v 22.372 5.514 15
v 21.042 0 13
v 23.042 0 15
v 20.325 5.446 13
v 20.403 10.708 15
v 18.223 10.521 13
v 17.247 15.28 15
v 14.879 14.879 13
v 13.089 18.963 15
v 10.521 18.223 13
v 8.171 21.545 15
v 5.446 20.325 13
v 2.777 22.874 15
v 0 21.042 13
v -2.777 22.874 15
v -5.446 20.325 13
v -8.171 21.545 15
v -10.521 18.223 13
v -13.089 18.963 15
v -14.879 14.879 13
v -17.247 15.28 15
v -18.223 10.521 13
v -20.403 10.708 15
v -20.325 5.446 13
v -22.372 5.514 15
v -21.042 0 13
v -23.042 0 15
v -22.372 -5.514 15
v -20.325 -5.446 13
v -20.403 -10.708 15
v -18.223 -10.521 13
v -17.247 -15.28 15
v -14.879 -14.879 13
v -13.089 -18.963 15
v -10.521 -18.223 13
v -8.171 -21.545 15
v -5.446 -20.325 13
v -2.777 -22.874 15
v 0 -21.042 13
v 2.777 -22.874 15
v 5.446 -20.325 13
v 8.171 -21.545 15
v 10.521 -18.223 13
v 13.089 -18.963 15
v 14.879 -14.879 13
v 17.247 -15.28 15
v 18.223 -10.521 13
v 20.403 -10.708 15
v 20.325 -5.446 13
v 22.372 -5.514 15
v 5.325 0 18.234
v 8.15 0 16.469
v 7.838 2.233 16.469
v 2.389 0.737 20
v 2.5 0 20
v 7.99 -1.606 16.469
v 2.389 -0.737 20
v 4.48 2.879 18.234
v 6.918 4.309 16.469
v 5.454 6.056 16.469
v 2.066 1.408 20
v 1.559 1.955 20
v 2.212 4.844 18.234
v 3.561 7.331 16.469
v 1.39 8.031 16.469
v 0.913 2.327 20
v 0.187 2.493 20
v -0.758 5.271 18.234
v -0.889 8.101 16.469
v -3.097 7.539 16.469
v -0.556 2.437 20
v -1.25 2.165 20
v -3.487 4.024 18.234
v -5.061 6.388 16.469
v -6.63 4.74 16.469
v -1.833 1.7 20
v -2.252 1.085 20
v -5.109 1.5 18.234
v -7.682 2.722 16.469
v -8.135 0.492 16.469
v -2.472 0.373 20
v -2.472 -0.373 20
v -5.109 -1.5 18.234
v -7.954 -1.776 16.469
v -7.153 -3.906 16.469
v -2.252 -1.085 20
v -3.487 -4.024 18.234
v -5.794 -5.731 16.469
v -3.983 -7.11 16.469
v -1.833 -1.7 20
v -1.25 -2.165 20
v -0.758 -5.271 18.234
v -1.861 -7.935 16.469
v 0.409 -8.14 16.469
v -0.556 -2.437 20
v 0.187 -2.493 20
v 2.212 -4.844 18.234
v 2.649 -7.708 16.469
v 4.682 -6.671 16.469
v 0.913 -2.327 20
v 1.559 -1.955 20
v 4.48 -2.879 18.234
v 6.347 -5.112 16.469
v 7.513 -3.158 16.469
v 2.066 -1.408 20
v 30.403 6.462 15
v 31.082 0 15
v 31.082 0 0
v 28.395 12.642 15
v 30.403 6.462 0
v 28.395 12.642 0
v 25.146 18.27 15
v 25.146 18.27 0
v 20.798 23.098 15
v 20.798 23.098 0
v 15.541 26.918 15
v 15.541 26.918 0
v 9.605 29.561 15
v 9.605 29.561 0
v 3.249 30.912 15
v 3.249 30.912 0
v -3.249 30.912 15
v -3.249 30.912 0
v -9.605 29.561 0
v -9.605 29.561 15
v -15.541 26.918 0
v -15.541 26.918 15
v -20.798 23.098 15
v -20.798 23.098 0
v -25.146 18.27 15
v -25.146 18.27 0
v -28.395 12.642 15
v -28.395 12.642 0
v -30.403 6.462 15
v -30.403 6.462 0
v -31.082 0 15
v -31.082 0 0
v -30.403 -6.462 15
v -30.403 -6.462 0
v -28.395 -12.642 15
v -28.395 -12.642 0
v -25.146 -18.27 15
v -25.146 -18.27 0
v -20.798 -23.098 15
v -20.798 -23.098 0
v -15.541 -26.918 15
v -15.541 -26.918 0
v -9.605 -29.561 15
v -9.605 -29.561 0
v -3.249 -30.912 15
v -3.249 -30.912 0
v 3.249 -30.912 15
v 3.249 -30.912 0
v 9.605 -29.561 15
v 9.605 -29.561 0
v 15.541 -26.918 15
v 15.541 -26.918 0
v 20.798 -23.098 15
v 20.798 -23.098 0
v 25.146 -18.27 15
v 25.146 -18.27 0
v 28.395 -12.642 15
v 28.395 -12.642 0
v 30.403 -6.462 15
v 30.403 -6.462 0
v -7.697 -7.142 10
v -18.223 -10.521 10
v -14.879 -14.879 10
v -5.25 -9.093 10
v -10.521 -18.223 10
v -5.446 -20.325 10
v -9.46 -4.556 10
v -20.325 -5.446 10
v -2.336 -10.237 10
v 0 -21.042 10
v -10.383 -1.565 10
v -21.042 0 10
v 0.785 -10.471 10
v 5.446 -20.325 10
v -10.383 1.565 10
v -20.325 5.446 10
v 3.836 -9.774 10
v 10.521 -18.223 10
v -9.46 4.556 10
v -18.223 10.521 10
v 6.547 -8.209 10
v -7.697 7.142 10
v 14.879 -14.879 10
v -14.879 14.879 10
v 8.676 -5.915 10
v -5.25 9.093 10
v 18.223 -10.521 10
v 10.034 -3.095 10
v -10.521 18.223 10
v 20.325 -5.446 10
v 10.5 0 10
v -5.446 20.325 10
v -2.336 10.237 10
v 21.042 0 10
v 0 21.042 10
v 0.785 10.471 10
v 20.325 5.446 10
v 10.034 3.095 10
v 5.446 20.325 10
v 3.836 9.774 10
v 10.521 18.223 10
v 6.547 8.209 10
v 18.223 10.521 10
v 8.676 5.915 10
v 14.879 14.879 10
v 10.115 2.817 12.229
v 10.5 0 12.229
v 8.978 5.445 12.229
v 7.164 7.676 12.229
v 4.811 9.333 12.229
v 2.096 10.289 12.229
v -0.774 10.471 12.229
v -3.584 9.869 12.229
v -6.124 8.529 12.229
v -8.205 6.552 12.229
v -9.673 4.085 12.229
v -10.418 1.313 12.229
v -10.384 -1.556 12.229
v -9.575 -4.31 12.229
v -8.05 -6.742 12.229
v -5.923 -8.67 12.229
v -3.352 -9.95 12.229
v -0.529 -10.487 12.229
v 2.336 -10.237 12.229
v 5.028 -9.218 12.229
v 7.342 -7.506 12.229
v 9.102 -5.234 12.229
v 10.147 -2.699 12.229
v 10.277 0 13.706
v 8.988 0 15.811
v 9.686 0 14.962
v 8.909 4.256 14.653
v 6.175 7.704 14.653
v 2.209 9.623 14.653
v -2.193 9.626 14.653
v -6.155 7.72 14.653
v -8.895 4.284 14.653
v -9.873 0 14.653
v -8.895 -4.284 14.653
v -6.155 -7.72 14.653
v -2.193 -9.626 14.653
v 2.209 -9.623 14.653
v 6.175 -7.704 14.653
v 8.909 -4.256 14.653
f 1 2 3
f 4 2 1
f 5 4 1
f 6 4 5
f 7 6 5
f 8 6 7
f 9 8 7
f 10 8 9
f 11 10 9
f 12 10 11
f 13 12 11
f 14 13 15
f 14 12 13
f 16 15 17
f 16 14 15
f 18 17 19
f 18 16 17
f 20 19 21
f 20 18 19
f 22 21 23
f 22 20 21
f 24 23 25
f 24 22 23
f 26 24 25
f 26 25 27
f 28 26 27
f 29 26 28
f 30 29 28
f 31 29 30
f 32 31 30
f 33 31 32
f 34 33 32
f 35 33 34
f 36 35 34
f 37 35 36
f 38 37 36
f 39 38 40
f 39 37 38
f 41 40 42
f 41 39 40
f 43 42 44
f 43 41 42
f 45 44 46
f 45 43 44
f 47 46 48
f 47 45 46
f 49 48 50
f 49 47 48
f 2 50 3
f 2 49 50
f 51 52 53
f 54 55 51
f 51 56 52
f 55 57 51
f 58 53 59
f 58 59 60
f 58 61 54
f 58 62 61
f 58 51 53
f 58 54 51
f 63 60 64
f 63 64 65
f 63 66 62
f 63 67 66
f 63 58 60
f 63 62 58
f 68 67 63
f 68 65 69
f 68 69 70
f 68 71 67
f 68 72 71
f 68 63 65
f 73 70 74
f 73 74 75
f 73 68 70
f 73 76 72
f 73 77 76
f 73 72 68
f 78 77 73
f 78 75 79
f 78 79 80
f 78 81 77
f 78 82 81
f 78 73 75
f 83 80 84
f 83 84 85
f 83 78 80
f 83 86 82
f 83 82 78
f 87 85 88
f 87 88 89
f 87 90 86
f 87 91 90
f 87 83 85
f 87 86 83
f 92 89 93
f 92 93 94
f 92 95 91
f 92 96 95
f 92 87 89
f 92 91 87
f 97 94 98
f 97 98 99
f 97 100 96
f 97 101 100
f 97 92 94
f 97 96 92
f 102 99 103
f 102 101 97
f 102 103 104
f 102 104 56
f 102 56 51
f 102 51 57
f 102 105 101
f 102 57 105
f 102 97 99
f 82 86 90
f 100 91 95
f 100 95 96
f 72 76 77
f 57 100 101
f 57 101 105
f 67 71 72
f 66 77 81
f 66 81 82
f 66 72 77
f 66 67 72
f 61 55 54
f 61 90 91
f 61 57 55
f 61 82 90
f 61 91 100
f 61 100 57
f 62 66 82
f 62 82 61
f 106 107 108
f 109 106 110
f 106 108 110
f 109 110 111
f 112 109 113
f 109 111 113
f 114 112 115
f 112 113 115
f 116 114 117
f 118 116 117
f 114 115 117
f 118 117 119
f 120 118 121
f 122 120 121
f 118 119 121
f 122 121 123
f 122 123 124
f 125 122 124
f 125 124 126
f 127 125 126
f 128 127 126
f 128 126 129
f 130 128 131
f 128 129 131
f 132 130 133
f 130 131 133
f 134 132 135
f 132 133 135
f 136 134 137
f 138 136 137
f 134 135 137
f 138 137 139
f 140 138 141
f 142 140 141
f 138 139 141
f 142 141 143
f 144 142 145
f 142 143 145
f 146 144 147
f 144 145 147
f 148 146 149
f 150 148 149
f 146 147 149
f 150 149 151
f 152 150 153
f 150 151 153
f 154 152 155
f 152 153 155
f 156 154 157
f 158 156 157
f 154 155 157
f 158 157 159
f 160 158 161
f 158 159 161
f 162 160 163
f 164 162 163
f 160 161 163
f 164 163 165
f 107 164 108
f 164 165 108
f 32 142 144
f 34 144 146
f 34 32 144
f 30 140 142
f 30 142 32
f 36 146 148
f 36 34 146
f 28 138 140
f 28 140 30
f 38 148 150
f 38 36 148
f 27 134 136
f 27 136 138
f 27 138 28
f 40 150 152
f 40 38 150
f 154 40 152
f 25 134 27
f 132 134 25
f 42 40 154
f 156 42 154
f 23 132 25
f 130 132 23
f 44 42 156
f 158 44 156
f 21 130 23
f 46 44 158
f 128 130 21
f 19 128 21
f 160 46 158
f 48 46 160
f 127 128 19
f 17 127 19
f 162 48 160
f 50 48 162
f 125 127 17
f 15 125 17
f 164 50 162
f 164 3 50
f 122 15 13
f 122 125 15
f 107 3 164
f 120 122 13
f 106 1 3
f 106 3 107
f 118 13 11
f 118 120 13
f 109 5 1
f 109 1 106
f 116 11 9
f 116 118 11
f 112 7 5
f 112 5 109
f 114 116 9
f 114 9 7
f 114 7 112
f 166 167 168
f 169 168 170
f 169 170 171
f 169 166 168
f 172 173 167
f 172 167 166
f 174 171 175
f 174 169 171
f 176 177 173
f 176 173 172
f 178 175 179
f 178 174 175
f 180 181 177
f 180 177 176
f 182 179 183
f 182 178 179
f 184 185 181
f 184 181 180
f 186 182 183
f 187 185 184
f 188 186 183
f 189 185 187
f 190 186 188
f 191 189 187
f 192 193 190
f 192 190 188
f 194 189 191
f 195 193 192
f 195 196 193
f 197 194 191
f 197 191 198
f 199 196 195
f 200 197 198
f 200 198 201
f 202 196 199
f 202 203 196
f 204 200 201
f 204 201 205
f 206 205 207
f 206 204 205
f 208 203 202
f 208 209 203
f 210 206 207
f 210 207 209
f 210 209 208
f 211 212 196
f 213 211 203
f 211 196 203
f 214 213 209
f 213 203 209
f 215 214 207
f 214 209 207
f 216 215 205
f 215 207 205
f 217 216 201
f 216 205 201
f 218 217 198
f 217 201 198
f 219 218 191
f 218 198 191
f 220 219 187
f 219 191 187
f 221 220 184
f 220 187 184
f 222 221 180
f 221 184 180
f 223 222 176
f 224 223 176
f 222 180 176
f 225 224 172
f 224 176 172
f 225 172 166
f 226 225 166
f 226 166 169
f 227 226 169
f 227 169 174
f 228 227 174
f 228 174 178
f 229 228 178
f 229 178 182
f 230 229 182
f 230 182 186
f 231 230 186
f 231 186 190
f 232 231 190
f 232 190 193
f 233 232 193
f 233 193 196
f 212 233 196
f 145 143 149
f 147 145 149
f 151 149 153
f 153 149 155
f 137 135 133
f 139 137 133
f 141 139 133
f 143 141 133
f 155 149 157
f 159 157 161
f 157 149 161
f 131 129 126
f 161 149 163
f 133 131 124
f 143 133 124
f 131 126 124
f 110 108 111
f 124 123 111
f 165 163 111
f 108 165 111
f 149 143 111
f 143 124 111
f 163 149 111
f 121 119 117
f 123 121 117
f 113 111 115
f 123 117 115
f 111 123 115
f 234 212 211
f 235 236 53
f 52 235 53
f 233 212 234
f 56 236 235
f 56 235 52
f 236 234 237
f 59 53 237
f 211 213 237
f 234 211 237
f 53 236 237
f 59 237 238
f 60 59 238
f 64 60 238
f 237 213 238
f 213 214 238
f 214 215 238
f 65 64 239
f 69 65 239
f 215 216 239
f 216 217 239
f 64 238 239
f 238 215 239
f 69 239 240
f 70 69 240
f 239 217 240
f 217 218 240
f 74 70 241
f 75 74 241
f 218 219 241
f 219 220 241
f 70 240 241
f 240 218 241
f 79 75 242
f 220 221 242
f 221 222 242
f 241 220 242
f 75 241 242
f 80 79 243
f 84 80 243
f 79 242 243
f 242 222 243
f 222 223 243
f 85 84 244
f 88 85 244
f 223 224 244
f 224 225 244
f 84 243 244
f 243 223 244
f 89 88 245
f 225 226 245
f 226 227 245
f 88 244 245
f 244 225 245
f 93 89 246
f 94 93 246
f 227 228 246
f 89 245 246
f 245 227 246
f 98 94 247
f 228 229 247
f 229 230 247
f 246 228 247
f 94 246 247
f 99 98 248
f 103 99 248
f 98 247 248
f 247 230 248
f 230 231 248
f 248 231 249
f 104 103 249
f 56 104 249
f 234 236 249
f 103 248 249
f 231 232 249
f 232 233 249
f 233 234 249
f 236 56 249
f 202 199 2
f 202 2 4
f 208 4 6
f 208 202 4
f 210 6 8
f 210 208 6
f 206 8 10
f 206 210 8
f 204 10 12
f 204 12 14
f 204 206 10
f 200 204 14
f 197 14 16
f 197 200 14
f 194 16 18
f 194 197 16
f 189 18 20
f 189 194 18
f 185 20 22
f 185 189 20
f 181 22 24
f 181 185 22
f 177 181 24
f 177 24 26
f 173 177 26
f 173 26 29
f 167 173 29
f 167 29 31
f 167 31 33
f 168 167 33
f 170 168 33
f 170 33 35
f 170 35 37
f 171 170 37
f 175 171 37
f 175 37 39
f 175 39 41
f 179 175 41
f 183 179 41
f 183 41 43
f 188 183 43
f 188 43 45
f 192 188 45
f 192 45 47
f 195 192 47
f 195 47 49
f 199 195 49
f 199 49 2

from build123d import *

# Parameters (mm, degrees)
F0_R     = 10.5
F1_DEPTH = 15
F0_R_2   = 21.042
F4_DEPTH = 10
F0_R_3   = 31.082
F5_DEPTH = 15
F6_SIZE  = 2
F7_R     = 5


with BuildPart() as f1:
    # F0 (on Top) → F1 (new body)
    with BuildSketch(Plane.XY):
        Circle(F0_R)
    extrude(amount=F1_DEPTH)

    # F2 (on Front) → F3 (revolve)
    with BuildSketch(Plane.XZ):
        Polygon((0, 15), (10.5, 15), (2.5, 20), (0, 20), align=None)
    revolve(axis=Axis((0, 0, 17.5), (0, 0, 1)))

    # F0 (on Top) → F4 (join)
    with BuildSketch(Plane.XY):
        Circle(F0_R_2)
        Circle(F0_R, mode=Mode.SUBTRACT)
    extrude(amount=F4_DEPTH)

    # F0 (on Top) → F5 (join)
    with BuildSketch(Plane.XY):
        Circle(F0_R_3)
        Circle(F0_R_2, mode=Mode.SUBTRACT)
    extrude(amount=F5_DEPTH)

    # F6
    f6_edges = [f1.edges().sort_by_distance(p)[0] for p in [
        (-21.042, 0, 15),
    ]]
    chamfer(f6_edges, length=F6_SIZE)

    # F7
    f7_edges = [f1.edges().sort_by_distance(p)[0] for p in [
        (-10.5, 0, 15),
    ]]
    fillet(f7_edges, radius=F7_R)


solid = f1.part
